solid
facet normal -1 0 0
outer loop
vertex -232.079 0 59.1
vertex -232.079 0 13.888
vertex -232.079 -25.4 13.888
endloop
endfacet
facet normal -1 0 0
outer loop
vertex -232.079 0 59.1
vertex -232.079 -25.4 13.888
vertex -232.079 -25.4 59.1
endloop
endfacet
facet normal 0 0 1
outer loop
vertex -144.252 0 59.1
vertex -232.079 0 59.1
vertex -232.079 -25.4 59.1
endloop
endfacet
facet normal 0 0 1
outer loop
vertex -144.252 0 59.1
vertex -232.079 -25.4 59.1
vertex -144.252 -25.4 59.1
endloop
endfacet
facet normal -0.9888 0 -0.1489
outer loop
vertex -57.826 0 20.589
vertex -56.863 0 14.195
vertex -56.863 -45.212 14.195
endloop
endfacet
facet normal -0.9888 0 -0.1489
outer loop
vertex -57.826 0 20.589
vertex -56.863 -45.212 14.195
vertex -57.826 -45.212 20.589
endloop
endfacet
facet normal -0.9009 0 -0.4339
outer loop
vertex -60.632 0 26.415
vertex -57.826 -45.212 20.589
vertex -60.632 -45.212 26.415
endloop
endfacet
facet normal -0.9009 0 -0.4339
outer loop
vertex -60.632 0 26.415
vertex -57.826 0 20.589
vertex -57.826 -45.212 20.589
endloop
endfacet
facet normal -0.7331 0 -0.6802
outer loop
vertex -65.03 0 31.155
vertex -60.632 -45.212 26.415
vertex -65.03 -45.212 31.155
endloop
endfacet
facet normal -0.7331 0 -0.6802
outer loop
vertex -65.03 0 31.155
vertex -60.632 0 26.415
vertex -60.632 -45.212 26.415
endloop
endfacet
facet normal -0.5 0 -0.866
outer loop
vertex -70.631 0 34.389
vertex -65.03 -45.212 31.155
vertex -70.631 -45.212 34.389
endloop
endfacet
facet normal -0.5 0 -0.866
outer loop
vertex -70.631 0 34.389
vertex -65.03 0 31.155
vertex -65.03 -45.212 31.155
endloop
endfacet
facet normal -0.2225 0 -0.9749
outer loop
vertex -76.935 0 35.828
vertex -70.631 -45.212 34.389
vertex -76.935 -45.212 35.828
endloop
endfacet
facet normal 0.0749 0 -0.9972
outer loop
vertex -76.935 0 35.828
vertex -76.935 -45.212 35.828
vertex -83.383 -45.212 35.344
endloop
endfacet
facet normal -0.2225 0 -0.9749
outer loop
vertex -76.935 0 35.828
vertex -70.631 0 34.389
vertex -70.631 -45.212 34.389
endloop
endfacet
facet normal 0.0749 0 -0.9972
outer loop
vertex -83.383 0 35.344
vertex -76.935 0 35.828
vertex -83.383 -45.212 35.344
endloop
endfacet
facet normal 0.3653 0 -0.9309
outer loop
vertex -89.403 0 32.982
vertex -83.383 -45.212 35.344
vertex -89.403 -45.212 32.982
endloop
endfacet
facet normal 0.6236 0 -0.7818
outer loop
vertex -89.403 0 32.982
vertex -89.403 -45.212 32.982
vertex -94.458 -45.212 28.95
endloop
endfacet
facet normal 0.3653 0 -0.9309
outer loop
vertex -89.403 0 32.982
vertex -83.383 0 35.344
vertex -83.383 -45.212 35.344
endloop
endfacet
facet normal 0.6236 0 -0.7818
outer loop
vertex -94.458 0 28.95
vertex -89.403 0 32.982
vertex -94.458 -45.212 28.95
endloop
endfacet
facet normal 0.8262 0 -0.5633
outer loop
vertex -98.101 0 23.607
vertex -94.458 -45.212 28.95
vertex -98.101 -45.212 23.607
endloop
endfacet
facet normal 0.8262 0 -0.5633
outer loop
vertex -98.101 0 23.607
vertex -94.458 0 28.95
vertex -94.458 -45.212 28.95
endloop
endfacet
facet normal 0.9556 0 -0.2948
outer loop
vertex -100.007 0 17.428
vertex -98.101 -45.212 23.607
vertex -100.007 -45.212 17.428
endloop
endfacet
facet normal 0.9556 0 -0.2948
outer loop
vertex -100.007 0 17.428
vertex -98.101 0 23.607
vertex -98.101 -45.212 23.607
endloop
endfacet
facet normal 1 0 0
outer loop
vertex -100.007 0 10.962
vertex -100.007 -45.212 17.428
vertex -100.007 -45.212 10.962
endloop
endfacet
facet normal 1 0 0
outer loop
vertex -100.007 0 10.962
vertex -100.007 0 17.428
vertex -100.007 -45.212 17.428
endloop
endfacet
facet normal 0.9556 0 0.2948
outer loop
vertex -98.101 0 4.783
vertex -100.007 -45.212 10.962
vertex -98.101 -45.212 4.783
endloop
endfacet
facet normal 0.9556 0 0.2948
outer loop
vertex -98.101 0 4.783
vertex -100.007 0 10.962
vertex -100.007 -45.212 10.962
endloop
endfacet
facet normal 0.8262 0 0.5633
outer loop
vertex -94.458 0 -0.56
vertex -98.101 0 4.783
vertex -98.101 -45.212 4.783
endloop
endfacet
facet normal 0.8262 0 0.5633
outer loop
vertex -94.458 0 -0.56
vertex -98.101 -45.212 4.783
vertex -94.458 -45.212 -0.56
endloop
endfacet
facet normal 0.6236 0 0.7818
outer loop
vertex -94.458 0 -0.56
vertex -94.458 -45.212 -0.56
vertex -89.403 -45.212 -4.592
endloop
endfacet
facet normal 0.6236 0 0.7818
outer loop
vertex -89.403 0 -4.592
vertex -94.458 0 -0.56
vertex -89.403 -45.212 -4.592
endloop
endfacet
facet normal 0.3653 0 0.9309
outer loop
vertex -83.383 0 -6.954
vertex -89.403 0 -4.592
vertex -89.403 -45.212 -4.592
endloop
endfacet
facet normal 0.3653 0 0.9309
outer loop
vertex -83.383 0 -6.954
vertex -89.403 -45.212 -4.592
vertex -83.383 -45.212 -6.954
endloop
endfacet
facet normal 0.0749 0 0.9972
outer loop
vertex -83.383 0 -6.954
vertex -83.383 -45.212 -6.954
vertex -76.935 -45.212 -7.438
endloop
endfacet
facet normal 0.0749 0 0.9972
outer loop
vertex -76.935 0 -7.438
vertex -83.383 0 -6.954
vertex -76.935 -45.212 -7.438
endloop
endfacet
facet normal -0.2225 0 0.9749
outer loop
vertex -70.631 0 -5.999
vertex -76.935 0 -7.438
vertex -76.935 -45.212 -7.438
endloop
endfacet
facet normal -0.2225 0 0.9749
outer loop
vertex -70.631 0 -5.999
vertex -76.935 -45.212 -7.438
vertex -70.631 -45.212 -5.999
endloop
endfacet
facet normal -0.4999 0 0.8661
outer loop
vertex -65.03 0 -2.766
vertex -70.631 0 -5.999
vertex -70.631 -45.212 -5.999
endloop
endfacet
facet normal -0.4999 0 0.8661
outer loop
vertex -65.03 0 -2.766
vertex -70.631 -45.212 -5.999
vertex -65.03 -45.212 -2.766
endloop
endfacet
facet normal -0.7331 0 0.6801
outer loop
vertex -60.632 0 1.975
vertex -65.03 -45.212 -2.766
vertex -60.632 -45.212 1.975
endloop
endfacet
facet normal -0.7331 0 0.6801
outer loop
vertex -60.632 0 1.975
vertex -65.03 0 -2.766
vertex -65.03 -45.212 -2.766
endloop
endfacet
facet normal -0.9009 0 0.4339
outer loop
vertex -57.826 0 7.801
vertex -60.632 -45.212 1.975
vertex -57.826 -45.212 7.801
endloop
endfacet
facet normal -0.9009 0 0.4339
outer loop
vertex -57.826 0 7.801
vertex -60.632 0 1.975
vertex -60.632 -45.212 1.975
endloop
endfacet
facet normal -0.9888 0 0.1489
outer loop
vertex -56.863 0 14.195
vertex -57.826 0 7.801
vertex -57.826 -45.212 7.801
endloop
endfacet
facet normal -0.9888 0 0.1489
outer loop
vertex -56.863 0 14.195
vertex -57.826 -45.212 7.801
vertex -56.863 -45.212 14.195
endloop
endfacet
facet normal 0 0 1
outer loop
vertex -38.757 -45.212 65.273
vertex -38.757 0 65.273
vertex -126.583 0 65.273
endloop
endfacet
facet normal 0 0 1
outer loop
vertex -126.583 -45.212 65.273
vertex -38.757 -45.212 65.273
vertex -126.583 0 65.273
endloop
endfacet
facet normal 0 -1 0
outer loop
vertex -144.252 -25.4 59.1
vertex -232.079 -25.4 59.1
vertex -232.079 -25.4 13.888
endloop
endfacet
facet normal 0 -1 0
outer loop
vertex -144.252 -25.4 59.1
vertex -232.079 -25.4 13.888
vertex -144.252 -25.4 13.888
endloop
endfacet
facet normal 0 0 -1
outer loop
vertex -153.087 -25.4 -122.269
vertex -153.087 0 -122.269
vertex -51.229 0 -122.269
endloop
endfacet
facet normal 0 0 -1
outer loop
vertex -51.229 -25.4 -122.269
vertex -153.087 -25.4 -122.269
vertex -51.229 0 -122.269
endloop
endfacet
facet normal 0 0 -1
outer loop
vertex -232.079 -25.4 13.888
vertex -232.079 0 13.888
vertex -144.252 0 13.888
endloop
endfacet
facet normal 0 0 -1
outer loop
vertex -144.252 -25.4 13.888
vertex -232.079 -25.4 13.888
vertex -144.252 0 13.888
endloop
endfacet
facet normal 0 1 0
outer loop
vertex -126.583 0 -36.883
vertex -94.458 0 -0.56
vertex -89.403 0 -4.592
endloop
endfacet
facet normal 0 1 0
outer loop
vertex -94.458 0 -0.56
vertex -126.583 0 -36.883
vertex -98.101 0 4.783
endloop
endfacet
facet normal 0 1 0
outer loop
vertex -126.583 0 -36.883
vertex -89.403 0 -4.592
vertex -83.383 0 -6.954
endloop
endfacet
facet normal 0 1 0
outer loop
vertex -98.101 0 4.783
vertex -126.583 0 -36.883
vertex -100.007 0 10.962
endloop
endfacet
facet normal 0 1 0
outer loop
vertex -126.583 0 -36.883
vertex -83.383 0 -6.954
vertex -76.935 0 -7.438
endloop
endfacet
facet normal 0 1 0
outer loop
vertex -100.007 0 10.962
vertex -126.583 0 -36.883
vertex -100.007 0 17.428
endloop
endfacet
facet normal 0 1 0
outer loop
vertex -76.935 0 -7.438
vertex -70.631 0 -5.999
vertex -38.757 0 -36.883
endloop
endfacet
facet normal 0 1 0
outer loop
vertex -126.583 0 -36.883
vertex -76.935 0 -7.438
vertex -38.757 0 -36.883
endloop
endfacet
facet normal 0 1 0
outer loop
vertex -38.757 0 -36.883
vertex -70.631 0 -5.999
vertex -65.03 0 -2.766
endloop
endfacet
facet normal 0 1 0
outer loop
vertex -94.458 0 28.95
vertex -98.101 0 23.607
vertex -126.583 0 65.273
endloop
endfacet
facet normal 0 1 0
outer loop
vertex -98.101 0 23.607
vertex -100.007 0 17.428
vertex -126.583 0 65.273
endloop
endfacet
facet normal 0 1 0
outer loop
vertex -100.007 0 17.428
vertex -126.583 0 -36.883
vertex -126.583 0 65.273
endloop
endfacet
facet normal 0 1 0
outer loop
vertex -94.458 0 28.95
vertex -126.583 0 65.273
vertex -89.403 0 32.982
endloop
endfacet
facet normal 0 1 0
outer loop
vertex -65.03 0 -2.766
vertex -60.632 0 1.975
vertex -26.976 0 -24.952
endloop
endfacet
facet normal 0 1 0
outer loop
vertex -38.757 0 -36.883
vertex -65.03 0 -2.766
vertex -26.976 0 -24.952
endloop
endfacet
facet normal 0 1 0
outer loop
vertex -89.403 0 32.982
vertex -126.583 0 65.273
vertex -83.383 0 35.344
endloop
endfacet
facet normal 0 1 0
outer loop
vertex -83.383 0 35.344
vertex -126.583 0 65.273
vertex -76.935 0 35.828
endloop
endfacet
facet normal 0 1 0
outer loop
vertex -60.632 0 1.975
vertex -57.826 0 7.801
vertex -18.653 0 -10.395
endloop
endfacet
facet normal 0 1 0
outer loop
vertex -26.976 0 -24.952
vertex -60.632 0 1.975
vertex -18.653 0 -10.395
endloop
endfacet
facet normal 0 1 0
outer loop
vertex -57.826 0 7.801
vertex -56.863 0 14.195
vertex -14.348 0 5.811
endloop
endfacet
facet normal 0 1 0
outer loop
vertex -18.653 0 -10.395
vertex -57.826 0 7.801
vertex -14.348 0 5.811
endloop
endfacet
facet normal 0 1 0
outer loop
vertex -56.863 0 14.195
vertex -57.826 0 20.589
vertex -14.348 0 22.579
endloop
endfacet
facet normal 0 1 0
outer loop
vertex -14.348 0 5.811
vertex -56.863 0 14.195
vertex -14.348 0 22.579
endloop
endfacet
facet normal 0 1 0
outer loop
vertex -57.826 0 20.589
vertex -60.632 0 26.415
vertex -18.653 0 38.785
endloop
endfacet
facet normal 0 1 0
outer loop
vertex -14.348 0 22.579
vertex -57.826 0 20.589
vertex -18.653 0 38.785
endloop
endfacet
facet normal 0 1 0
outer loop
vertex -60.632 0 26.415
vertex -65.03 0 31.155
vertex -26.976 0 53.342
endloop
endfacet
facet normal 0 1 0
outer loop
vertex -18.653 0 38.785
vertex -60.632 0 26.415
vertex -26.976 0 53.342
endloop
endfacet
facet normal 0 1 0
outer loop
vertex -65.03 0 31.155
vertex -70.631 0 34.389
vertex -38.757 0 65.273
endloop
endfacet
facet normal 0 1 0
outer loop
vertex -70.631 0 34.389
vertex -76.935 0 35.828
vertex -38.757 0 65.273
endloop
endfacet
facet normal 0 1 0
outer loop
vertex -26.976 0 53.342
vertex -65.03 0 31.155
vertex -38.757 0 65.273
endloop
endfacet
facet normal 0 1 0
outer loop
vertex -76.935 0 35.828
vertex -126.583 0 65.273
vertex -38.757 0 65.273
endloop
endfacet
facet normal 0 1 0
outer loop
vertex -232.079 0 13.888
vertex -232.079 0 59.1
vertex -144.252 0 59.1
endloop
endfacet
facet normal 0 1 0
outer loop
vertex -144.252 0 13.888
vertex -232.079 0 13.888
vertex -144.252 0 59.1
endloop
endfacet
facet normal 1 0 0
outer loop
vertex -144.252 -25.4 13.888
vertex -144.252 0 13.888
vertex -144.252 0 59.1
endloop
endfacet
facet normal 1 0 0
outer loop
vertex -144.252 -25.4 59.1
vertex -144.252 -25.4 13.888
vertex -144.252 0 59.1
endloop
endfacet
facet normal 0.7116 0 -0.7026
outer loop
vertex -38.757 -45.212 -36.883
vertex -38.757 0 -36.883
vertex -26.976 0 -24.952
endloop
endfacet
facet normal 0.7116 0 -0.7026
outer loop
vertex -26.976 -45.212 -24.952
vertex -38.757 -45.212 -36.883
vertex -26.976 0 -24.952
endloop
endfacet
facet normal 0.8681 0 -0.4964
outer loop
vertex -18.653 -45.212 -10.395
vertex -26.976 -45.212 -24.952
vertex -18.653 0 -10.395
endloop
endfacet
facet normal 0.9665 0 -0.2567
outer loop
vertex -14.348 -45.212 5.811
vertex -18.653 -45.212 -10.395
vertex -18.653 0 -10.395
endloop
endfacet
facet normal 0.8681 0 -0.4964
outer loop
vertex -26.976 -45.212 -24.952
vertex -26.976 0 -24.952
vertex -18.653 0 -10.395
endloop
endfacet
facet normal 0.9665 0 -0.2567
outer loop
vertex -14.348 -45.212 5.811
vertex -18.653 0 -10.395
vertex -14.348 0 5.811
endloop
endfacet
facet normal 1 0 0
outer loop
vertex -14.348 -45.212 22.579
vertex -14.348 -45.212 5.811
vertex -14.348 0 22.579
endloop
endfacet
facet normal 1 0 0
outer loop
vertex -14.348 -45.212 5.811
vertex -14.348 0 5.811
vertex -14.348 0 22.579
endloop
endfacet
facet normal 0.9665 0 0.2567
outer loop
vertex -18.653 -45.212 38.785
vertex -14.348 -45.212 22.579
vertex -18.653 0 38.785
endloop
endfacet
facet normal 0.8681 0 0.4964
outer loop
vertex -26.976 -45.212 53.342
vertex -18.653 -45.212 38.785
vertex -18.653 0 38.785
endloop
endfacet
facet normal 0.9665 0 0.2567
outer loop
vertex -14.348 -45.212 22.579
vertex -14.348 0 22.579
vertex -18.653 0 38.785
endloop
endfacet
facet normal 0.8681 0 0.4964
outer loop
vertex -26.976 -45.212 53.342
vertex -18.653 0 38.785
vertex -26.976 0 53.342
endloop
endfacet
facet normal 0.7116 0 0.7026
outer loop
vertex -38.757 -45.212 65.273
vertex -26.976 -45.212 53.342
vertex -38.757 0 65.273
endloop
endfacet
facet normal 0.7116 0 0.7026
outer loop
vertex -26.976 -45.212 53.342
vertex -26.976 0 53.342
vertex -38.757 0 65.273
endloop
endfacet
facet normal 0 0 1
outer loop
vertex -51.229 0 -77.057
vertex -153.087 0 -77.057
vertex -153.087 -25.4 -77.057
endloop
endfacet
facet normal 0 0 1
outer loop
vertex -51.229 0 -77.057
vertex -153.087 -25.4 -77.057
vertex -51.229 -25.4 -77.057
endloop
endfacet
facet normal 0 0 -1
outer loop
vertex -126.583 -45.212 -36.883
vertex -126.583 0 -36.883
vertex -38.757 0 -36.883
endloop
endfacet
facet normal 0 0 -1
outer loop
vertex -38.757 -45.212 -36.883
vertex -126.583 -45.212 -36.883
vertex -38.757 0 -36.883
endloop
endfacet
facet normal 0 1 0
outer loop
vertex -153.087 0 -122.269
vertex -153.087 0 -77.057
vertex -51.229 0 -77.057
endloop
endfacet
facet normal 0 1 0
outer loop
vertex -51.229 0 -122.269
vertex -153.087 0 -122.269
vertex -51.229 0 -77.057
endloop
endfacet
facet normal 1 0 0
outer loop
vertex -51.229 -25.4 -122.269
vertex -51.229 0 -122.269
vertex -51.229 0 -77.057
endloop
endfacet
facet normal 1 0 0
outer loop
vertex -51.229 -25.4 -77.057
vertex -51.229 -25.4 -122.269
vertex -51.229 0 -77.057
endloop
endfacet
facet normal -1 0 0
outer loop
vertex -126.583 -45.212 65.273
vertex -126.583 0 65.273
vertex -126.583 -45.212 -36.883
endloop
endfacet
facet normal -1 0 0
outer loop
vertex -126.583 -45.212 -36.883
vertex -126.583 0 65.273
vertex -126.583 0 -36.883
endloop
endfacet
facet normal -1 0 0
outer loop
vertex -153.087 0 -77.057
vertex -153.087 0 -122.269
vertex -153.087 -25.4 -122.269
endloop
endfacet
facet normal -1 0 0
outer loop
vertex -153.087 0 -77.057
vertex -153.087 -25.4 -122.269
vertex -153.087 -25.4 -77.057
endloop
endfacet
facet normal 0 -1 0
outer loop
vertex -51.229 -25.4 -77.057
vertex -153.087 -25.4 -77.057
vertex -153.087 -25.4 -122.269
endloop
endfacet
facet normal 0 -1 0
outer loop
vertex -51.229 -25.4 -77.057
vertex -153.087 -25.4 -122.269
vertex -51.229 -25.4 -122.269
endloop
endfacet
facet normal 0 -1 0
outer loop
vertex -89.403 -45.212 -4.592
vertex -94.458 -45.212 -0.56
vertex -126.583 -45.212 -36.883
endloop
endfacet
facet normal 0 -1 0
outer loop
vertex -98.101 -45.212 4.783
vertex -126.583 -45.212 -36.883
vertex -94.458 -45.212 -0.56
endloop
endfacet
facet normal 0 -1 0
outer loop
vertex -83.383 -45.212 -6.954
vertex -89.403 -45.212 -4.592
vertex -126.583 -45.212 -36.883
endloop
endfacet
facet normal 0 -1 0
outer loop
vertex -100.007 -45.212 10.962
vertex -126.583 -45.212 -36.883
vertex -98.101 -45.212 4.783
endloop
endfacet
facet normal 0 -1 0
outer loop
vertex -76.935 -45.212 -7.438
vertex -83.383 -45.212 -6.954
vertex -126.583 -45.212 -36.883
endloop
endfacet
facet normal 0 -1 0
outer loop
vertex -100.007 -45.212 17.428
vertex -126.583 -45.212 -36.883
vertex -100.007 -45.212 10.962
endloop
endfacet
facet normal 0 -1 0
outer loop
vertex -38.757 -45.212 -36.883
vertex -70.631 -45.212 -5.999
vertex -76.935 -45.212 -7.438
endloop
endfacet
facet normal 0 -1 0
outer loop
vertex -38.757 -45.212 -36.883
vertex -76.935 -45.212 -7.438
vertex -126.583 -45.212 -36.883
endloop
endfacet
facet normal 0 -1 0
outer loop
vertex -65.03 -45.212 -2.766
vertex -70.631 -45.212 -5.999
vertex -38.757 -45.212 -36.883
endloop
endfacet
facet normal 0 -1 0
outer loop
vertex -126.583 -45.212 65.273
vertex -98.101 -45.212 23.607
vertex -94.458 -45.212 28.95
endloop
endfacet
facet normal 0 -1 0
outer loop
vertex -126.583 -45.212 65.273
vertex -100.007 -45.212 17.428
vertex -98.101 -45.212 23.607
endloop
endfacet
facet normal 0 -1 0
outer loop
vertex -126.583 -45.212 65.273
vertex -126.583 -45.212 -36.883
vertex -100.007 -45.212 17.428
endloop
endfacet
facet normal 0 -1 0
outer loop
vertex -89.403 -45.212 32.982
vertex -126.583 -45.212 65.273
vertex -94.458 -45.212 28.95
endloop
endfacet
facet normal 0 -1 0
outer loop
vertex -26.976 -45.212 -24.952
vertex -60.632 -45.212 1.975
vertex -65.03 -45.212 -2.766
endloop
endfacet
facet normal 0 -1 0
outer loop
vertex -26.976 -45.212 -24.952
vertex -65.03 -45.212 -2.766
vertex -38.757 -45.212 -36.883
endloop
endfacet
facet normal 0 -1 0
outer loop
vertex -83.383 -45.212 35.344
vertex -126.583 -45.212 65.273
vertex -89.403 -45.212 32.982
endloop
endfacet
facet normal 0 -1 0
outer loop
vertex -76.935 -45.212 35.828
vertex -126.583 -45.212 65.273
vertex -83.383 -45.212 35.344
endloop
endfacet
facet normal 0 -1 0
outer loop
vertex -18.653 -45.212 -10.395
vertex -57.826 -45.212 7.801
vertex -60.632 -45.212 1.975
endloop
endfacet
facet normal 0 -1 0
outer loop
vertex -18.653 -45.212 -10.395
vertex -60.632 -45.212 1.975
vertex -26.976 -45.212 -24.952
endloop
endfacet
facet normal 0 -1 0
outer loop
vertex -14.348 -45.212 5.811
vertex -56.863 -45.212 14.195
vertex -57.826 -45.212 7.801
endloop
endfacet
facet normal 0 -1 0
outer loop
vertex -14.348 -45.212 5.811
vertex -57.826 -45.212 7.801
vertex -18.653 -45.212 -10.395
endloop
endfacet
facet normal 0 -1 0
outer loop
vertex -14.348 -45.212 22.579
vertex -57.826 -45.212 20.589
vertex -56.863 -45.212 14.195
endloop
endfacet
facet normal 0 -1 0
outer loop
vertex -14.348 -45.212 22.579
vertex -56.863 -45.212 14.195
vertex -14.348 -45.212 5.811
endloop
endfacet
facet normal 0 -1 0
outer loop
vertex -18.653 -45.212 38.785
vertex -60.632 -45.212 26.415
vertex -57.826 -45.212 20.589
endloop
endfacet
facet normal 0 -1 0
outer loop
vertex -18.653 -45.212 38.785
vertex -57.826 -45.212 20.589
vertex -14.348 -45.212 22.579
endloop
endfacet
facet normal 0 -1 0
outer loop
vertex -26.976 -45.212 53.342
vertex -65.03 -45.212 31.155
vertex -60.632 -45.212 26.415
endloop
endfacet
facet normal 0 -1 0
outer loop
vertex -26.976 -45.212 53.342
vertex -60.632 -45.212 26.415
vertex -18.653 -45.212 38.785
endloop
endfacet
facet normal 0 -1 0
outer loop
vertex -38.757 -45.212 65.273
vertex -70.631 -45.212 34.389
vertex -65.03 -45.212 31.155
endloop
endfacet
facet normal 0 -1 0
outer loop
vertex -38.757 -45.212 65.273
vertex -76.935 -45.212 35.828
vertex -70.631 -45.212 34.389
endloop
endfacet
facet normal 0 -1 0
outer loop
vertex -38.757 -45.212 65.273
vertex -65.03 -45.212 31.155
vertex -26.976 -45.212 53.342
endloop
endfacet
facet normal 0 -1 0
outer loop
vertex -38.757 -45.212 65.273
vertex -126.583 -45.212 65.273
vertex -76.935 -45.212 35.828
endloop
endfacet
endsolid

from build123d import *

# Parameters (mm, degrees)
F2_R     = 21.693269
F3_DEPTH = 45.212
F1_W     = 87.826267
F1_H     = 45.212337
F4_DEPTH = 25.4
F0_W     = 101.857689
F0_H     = 45.212336
F5_DEPTH = 25.4


with BuildPart() as f3:
    # F2 (on Front) → F3 (new body)
    with BuildSketch(Plane.XZ):
        with BuildLine():
            Line((-126.583278, 65.273397), (-126.583278, -36.883458))
            Line((-126.583278, -36.883458), (-38.757015, -36.883458))
            ThreePointArc((-38.757015, -36.883458), (-13.802886, 14.194969), (-38.757015, 65.273397))
            Line((-38.757015, 65.273397), (-126.583278, 65.273397))
        make_face()
        with Locations((-78.555984, 14.194969)):
            Circle(F2_R, mode=Mode.SUBTRACT)
    extrude(amount=F3_DEPTH)


with BuildPart() as f4:
    # F1 (on Front) → F4 (new body)
    with BuildSketch(Plane.XZ):
        with Locations((-188.165597, 36.493818)):
            Rectangle(F1_W, F1_H)
    extrude(amount=F4_DEPTH)


with BuildPart() as f5:
    # F0 (on Front) → F5 (new body)
    with BuildSketch(Plane.XZ):
        with Locations((-102.15822, -99.662874)):
            Rectangle(F0_W, F0_H)
    extrude(amount=F5_DEPTH)


solid = Compound([f3.part, f4.part, f5.part])
